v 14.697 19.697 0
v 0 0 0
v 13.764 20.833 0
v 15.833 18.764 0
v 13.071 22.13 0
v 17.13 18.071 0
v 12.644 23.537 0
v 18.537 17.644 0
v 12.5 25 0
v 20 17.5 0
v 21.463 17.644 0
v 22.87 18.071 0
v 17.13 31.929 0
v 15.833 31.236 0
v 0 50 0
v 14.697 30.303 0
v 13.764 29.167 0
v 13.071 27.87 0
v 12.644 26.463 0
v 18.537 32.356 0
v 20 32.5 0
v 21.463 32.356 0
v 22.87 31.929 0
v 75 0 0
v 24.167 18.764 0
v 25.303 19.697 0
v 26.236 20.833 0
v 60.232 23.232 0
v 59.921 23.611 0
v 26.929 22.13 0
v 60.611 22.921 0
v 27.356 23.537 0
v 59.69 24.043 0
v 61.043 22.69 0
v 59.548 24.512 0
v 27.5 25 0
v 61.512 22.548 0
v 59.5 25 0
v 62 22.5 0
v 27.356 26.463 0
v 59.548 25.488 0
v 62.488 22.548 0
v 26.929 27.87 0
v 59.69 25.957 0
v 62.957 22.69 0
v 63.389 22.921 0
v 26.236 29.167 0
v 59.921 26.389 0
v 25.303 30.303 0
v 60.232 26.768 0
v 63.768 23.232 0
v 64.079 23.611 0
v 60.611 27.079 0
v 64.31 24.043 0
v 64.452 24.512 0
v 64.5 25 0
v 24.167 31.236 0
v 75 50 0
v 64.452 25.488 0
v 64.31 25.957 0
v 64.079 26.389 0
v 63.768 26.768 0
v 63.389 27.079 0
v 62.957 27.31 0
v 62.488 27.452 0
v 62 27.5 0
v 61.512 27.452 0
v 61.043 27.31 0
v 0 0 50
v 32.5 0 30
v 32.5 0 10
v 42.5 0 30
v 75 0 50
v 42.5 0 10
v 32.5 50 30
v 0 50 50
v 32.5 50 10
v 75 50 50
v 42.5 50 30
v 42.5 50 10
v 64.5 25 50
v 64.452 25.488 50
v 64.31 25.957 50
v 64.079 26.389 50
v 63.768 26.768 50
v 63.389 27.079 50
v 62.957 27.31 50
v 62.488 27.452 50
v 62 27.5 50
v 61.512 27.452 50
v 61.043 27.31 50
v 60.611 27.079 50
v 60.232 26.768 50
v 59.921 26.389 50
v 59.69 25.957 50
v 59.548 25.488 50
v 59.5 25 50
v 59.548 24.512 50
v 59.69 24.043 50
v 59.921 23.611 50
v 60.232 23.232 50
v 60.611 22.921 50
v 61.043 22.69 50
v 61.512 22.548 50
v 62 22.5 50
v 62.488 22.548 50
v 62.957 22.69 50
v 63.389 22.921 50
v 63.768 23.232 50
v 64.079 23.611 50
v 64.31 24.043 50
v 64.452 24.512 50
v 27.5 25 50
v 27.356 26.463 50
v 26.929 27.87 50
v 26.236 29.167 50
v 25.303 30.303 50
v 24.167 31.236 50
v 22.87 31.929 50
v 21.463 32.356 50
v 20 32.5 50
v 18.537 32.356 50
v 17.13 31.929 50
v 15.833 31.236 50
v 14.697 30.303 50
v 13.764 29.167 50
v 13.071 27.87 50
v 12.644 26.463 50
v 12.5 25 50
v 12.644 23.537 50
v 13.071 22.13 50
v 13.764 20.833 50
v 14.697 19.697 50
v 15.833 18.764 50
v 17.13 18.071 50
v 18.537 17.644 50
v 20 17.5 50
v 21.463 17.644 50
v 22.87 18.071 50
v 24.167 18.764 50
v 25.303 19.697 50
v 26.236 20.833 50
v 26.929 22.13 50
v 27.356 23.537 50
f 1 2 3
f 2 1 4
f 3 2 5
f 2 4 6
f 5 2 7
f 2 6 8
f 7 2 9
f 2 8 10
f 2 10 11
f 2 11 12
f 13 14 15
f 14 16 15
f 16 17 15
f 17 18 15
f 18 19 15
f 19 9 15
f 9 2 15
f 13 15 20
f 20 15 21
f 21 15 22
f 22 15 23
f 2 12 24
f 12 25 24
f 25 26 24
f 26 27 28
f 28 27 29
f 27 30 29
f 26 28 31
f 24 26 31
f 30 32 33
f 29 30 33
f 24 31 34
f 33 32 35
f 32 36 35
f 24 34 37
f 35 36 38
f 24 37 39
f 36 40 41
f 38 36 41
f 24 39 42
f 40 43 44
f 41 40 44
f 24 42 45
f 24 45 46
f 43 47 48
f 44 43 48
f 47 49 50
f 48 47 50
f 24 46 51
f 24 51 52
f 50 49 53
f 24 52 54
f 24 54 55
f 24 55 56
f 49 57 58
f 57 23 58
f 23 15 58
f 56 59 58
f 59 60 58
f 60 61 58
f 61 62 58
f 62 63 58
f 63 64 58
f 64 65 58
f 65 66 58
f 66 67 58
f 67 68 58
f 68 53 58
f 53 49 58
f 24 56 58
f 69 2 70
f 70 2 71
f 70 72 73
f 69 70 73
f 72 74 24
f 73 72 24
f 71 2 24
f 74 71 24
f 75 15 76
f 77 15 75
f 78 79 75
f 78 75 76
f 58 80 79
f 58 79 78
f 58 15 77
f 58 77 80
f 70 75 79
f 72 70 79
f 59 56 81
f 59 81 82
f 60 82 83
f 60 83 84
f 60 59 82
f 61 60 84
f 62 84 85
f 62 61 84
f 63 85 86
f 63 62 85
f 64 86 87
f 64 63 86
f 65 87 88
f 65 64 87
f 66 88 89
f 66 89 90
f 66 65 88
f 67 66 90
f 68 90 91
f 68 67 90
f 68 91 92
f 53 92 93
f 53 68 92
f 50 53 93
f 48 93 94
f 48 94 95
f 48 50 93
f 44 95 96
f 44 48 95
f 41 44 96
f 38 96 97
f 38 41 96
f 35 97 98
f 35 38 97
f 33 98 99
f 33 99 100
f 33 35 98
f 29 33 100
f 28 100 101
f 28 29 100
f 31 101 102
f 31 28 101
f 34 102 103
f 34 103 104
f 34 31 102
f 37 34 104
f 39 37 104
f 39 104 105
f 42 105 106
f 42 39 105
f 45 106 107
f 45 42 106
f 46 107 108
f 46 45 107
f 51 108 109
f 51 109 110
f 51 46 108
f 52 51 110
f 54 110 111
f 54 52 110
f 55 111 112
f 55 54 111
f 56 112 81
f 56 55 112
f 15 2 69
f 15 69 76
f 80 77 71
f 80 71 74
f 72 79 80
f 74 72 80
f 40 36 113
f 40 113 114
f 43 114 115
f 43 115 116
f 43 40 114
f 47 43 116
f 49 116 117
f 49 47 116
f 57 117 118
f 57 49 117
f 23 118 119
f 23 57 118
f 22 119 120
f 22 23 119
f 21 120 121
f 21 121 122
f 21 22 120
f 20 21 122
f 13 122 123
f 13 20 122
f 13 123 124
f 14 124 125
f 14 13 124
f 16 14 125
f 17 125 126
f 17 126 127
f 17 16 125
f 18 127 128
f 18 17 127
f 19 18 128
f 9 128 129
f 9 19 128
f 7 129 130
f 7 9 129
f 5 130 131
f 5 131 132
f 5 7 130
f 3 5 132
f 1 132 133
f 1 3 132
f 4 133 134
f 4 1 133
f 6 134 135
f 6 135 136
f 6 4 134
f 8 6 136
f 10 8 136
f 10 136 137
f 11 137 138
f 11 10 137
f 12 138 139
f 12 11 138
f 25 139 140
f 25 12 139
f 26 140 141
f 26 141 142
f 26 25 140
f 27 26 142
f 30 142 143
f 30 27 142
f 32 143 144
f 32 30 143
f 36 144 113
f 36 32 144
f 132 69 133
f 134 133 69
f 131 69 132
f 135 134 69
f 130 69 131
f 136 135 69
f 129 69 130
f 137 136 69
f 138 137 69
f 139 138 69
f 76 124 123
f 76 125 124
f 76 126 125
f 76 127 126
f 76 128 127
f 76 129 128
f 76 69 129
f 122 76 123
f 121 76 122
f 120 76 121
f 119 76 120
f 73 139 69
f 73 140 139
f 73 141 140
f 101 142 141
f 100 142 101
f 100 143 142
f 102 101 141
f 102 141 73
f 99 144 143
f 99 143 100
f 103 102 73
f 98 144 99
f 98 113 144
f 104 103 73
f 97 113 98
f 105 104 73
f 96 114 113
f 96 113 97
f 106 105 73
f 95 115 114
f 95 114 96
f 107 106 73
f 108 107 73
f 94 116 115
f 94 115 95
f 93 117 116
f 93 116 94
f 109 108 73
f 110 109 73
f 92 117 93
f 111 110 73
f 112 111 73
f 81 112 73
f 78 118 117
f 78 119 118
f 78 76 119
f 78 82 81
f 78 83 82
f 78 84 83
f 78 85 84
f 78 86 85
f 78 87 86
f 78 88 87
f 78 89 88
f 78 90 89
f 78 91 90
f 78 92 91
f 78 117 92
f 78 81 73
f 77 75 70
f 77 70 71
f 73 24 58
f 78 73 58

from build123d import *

# Parameters (mm, degrees)
SKETCH1_W           = 75
SKETCH1_H           = 50
SKETCH1_R           = 7.5
SKETCH1_R_2         = 2.5
BOSS_EXTRUDE1_DEPTH = 50
SKETCH2_W           = 10
SKETCH2_H           = 20
CUT_EXTRUDE1_DEPTH  = 104.07764064


with BuildPart() as part:
    # Sketch1 → Boss-Extrude1 (new body)
    with BuildSketch(Plane.XY):
        with Locations((37.5, 25)):
            Rectangle(SKETCH1_W, SKETCH1_H)
        with Locations((20, 25)):
            Circle(SKETCH1_R, mode=Mode.SUBTRACT)
        with Locations((62, 25)):
            Circle(SKETCH1_R_2, mode=Mode.SUBTRACT)
    extrude(amount=BOSS_EXTRUDE1_DEPTH)

    # Sketch2 → Cut-Extrude1 (cut, through all)
    with BuildSketch(Plane(origin=(0, 50, 0), x_dir=(1, 0, 0), z_dir=(0, 1, 0))):
        with Locations((37.5, -20)):
            Rectangle(SKETCH2_W, SKETCH2_H)
    extrude(amount=-CUT_EXTRUDE1_DEPTH, mode=Mode.SUBTRACT)


solid = part.part
